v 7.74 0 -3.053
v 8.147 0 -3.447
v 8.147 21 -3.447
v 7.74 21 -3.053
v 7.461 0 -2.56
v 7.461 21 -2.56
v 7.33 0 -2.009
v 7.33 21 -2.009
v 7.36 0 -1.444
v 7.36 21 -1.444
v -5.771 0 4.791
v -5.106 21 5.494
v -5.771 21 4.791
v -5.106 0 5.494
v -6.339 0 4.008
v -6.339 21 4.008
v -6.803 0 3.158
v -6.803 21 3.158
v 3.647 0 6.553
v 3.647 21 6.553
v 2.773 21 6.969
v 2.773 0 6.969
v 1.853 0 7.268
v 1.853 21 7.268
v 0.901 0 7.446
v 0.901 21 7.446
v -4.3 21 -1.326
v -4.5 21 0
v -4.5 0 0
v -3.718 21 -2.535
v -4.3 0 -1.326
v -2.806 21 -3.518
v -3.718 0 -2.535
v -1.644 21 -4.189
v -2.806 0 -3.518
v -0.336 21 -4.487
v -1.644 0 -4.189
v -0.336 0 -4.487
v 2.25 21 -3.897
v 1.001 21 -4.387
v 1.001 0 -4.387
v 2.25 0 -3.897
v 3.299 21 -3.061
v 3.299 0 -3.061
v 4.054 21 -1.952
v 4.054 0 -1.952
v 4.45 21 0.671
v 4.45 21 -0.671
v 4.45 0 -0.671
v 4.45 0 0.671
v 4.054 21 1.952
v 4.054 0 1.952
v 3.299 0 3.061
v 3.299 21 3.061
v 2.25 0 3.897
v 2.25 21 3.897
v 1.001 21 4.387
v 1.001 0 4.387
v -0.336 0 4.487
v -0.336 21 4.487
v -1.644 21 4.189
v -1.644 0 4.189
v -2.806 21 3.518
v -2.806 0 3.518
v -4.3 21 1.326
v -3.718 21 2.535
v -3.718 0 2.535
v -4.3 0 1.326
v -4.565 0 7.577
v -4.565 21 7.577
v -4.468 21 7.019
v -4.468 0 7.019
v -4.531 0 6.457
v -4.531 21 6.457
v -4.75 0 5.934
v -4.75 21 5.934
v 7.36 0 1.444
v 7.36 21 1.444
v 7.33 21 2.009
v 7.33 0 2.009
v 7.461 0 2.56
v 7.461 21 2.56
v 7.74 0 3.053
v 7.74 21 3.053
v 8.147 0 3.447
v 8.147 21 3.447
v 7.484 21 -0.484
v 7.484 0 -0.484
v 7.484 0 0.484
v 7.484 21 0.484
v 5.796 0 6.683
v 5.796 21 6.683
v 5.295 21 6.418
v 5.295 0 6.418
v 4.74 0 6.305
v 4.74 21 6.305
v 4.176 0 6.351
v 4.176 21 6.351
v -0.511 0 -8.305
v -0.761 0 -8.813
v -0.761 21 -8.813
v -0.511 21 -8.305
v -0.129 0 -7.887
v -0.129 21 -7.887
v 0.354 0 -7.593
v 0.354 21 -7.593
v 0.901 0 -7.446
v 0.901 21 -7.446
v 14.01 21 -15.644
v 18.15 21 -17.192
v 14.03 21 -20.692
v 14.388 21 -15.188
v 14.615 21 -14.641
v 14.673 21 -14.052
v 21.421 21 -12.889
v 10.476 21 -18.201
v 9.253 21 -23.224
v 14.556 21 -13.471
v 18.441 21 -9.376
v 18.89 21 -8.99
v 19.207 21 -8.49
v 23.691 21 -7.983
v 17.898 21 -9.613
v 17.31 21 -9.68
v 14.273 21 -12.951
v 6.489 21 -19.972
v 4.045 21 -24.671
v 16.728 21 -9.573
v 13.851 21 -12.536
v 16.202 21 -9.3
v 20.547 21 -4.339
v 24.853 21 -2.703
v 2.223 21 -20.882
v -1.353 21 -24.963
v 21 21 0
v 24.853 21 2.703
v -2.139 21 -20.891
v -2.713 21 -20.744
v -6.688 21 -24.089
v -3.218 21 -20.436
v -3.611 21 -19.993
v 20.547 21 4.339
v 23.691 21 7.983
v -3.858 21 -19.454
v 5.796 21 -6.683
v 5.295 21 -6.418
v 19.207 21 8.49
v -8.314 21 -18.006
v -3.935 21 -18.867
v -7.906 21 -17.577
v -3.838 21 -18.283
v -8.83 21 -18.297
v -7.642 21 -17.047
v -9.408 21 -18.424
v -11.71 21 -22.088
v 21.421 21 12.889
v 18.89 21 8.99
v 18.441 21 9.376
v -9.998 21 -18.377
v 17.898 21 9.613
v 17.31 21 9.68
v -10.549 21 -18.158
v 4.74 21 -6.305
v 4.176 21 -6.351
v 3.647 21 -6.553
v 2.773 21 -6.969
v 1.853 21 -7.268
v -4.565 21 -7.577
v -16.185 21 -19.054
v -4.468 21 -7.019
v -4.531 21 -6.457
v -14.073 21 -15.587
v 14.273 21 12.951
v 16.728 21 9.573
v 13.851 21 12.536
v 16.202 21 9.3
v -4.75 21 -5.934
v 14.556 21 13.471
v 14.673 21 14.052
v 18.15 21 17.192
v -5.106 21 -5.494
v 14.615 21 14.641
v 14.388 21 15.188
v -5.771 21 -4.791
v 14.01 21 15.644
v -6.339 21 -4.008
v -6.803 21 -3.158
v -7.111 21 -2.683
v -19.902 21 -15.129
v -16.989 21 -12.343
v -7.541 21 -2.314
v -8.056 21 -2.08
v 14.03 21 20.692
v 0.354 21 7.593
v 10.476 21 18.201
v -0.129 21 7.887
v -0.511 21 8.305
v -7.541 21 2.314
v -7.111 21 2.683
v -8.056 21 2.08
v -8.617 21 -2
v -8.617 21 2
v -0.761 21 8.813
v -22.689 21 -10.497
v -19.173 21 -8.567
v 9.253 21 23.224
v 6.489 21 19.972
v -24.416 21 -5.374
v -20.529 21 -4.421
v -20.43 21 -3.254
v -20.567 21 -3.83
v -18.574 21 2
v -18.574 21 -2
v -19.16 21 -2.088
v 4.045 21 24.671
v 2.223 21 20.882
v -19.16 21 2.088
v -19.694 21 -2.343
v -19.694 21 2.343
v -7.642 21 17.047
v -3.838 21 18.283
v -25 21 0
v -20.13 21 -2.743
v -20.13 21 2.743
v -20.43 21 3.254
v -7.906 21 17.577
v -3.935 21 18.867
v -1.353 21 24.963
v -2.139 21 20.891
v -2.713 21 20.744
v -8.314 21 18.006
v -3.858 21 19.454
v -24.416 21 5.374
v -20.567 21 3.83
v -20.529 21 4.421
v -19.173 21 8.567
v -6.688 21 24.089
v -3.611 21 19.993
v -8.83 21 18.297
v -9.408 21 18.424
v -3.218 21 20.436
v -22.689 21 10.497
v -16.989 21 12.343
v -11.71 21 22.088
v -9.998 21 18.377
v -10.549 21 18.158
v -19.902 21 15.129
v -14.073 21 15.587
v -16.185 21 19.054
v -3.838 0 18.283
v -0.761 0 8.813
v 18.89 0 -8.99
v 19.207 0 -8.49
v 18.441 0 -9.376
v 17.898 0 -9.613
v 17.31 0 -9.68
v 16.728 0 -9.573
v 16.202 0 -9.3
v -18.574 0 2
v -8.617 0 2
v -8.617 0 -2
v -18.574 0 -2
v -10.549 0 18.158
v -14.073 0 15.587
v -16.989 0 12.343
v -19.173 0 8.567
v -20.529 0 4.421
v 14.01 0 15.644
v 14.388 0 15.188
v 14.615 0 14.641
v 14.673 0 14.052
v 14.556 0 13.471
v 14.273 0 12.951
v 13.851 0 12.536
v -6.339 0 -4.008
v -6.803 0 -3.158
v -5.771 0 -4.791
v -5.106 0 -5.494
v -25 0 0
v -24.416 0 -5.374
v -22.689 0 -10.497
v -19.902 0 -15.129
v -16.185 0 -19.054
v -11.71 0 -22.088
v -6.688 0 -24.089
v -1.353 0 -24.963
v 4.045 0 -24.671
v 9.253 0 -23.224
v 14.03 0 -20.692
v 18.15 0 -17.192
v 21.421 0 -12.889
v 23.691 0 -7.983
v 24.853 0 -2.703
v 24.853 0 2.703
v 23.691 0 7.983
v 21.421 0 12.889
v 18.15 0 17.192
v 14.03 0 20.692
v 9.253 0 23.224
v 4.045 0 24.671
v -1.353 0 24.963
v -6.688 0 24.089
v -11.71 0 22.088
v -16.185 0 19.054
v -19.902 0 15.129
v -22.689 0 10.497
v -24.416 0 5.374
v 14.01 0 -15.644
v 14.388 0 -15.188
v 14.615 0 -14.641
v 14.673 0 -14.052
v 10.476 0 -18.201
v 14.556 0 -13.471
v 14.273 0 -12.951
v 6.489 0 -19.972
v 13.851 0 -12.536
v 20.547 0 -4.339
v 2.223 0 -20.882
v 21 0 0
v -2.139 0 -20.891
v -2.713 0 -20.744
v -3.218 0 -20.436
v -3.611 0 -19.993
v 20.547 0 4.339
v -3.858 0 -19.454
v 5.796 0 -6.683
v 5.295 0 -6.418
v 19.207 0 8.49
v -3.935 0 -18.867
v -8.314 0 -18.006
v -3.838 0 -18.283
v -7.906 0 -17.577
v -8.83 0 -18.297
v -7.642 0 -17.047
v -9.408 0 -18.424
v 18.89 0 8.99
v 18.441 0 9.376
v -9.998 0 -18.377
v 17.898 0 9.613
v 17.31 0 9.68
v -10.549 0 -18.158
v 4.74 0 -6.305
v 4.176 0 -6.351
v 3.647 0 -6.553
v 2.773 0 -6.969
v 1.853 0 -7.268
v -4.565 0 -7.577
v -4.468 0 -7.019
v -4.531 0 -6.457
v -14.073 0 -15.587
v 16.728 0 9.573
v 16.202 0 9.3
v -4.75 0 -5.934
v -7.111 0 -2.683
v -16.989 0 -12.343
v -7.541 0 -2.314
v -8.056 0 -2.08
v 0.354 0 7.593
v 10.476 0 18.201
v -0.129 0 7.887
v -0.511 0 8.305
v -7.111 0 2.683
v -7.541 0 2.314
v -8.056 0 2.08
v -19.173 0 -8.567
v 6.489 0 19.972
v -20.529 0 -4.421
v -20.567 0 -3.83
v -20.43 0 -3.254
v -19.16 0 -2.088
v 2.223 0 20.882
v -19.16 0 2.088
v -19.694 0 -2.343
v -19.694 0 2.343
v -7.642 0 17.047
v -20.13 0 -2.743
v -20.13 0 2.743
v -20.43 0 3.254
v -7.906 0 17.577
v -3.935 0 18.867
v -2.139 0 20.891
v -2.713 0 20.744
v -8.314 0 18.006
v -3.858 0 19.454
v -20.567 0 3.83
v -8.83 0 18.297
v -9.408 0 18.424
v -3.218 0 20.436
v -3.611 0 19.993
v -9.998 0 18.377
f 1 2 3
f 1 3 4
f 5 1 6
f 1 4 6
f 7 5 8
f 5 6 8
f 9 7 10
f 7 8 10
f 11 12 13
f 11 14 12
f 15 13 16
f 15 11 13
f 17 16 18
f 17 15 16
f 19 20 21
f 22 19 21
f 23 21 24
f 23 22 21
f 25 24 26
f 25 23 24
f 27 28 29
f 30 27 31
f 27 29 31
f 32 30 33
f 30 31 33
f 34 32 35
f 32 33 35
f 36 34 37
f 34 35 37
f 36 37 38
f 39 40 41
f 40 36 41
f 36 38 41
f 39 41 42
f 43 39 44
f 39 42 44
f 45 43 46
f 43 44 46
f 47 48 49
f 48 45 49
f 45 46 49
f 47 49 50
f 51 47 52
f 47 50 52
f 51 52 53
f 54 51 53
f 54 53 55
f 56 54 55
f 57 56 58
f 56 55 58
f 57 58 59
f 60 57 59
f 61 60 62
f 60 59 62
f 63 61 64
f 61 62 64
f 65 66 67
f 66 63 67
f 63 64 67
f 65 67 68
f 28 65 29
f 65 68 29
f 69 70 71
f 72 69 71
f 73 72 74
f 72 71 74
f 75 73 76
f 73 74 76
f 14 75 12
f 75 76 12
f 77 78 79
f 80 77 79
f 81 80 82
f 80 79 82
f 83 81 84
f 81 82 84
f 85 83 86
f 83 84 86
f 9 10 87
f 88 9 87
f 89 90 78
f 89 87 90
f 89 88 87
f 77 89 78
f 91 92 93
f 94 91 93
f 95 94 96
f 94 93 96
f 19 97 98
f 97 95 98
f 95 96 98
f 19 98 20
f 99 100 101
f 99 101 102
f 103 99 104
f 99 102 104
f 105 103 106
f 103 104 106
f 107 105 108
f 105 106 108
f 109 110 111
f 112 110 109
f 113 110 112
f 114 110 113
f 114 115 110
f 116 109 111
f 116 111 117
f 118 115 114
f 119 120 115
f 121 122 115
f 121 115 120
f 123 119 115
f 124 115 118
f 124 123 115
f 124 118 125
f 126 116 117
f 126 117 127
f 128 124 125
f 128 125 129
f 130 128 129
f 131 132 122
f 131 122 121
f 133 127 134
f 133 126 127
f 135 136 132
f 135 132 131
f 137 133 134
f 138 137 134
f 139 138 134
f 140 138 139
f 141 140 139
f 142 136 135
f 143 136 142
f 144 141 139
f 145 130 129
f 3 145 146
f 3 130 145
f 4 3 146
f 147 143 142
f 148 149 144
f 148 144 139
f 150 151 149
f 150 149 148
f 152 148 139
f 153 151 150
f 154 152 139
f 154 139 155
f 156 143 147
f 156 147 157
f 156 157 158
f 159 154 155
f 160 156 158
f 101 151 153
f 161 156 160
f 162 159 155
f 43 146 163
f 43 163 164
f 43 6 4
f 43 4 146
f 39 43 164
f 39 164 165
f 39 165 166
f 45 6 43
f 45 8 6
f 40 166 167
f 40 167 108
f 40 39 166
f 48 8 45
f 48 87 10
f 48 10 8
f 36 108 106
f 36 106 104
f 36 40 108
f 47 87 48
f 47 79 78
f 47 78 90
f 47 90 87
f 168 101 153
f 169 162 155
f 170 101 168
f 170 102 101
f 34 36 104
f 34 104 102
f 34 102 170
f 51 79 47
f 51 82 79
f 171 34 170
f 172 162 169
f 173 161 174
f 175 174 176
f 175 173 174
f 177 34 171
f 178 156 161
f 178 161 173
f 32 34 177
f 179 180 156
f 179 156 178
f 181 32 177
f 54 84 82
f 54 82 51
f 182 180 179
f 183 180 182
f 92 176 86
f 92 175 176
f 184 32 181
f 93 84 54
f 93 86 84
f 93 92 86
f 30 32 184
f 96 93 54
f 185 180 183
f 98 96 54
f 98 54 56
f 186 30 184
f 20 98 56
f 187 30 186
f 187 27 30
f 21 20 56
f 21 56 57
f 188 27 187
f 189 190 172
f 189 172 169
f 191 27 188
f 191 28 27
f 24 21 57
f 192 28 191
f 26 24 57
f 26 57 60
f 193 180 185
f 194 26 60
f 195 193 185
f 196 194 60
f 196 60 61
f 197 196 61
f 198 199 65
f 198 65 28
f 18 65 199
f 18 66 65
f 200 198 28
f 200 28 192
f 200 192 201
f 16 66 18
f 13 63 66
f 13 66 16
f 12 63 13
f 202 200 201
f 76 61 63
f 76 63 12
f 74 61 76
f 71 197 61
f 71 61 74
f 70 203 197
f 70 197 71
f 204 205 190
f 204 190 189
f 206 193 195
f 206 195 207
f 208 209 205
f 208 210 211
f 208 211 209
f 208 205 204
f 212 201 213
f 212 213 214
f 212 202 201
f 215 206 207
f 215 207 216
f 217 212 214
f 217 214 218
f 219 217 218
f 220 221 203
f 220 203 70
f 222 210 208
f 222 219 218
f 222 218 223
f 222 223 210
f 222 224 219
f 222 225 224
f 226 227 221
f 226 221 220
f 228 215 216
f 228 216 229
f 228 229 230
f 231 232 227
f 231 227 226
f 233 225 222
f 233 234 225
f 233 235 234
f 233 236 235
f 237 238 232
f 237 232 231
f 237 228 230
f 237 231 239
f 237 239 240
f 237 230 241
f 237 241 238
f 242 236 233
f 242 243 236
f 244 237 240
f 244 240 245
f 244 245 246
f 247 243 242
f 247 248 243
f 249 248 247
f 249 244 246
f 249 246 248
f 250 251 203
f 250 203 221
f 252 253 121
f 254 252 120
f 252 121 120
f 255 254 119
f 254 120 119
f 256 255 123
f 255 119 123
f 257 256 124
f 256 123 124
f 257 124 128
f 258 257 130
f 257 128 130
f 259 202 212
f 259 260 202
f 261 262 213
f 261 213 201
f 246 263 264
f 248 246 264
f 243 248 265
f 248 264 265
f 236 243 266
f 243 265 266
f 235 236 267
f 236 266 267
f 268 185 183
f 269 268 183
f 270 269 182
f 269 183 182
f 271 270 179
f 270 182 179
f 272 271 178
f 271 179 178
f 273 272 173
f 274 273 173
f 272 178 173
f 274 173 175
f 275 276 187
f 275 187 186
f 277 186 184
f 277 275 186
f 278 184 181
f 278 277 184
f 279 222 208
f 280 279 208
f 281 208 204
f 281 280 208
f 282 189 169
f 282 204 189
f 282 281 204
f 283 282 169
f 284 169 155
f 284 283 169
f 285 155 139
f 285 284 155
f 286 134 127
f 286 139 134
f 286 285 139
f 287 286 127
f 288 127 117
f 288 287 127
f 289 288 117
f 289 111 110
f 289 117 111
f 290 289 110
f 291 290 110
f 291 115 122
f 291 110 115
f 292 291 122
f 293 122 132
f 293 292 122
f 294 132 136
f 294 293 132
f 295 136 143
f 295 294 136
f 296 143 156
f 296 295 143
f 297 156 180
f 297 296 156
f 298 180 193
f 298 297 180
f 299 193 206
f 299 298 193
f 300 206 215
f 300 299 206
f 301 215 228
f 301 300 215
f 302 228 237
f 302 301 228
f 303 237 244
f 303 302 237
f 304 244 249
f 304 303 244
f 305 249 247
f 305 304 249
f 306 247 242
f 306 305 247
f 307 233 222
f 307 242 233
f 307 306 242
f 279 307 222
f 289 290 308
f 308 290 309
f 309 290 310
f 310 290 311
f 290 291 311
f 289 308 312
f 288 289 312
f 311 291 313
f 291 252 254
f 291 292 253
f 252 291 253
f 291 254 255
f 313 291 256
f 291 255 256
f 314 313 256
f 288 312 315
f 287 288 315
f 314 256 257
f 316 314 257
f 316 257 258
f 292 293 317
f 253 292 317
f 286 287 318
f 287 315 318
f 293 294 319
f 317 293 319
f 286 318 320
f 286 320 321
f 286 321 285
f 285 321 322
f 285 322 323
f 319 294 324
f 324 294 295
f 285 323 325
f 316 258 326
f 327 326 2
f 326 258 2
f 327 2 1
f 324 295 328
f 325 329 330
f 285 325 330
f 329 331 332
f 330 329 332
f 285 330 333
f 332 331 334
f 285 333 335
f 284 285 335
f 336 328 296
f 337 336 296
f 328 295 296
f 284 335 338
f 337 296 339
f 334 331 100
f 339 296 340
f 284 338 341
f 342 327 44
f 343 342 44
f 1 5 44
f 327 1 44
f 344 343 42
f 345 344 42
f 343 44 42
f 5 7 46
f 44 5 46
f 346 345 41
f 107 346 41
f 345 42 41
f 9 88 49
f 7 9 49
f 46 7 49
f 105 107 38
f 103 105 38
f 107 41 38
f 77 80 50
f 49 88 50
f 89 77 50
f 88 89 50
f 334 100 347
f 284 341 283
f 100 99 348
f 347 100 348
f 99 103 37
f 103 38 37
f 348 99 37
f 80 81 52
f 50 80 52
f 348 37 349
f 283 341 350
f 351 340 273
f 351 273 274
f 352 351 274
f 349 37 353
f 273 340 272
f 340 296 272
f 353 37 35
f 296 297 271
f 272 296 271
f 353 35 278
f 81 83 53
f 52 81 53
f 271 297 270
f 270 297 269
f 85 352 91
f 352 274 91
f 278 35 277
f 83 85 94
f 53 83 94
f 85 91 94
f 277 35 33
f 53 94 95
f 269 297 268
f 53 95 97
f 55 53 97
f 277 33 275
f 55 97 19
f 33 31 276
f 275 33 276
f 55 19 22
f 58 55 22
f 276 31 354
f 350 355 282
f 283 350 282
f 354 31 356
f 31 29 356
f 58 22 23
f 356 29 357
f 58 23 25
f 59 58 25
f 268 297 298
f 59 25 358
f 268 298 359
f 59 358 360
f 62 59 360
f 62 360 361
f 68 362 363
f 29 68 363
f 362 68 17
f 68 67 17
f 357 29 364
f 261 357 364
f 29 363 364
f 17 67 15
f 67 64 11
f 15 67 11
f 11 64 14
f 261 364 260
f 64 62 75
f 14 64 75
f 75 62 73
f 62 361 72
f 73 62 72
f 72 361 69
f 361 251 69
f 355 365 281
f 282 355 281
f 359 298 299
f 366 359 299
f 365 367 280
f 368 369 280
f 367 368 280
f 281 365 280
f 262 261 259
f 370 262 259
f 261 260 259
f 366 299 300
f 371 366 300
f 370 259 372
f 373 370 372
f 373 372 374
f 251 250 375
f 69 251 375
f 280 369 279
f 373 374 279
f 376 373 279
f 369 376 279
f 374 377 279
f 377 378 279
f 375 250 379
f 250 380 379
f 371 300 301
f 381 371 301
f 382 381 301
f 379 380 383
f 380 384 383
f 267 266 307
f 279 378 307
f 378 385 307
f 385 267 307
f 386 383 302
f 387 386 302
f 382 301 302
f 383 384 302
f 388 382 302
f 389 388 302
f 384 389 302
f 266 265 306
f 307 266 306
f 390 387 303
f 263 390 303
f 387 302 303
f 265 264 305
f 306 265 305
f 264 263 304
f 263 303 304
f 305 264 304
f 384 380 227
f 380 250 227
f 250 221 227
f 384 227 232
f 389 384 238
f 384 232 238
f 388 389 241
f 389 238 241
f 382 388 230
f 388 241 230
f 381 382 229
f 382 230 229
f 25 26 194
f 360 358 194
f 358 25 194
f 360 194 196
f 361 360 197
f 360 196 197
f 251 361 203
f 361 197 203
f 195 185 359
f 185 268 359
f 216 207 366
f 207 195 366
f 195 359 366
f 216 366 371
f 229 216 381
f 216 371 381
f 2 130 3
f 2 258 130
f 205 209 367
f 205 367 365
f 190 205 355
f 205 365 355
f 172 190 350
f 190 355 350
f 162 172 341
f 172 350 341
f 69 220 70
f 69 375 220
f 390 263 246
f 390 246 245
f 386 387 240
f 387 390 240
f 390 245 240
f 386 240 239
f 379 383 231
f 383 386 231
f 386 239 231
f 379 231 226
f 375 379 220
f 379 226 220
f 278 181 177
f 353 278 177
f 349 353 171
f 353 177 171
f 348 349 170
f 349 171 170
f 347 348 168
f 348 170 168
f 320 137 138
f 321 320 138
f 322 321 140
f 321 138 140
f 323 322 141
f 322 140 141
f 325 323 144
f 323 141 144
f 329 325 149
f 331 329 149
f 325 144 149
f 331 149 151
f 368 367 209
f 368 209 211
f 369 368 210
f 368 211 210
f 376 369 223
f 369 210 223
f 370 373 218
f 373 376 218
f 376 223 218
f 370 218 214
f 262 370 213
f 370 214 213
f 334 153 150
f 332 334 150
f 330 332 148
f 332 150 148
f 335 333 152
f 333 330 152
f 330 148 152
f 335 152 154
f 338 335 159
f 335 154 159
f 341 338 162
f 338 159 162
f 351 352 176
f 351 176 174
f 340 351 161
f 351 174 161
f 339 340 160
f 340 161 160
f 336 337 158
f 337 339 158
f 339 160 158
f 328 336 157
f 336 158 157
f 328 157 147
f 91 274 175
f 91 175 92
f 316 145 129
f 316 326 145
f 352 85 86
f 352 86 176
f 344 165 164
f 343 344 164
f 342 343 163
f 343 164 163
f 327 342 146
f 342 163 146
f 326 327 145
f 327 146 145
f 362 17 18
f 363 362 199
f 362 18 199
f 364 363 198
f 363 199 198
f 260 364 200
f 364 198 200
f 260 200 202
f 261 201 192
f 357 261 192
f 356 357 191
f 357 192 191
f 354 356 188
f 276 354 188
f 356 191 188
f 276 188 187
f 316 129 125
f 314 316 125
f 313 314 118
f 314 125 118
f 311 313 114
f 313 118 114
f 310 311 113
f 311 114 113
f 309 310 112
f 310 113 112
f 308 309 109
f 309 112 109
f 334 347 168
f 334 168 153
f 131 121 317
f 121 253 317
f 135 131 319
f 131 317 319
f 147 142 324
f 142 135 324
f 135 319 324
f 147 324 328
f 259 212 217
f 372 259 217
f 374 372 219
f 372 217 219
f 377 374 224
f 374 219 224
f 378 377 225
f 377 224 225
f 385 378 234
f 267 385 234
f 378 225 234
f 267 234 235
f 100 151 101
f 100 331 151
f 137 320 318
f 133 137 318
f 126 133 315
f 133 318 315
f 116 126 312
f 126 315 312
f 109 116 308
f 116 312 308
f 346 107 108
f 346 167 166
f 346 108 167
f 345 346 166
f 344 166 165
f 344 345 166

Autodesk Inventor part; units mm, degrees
ref_plane "YZ Plane" through (0, 0, 0) normal (1, 0, 0) x (0, 1, 0)
ref_plane "XZ Plane" through (0, 0, 0) normal (0, 1, 0) x (-1, 0, 0)
ref_plane "XY Plane" through (0, 0, 0) normal (0, 0, 1) x (1, 0, 0)
sketch "Sketch1" plane through (0, 0, 0) normal (0, 1, 0) x (-1, 0, 0)
  circle A0 centre (0, 0) radius 4.5
  circle A1 centre (0, 0) radius 25
  circle A2 centre (0, 0) radius 7.5
  circle A3 centre (0, 0) radius 21
  line L0 (0, 0) -> (25, 0)
  line L1 (22.5, 2) -> (22.5, -2)
  line L2 (22.5, -2) -> (2.5, -2)
  line L3 (2.5, -2) -> (2.5, 2)
  line L4 (2.5, 2) -> (22.5, 2)
  line L5 (22.5, 2) -> (2.5, -2) construction
  line L6 (22.5, -2) -> (2.5, 2) construction
  line L7 (5.0508, 22.0168) -> (8.855, 20.7807)
  line L8 (-1.1296, 2.9957) -> (5.0508, 22.0168)
  line L9 (8.855, 20.7807) -> (2.6747, 1.7596)
  line L10 (2.6747, 1.7596) -> (-1.1296, 2.9957)
  line L11 (-19.3785, 11.6071) -> (-17.0273, 14.8432)
  line L12 (-3.1981, -0.1486) -> (-19.3785, 11.6071)
  line L13 (-17.0273, 14.8432) -> (-0.847, 3.0875)
  line L14 (-0.847, 3.0875) -> (-3.1981, -0.1486)
  line L15 (-17.0273, -14.8432) -> (-19.3785, -11.6071)
  line L16 (-0.847, -3.0875) -> (-17.0273, -14.8432)
  line L17 (-19.3785, -11.6071) -> (-3.1981, 0.1486)
  line L18 (-3.1981, 0.1486) -> (-0.847, -3.0875)
  line L19 (8.855, -20.7807) -> (5.0508, -22.0168)
  line L20 (2.6747, -1.7596) -> (8.855, -20.7807)
  line L21 (5.0508, -22.0168) -> (-1.1296, -2.9957)
  line L22 (-1.1296, -2.9957) -> (2.6747, -1.7596)
  point P0 (12.5, 0)
  point P1 (7.2284, -2)
  point P2 (20.9045, -2)
  point P3 (8.362, -19.2634)
  point P4 (4.1358, -6.2566)
  point P5 (7.2284, 2)
  point P6 (4.1358, 6.2566)
  point P7 (8.362, 19.2634)
  point P8 (20.9045, 2)
  point P9 (0.3316, 7.4927)
  point P10 (-4.6723, 5.8668)
  point P11 (-15.7366, 13.9054)
  point P12 (4.5577, 20.4994)
  point P13 (-4.6723, -5.8668)
  point P14 (0.3316, -7.4927)
  point P15 (4.5577, -20.4994)
  point P16 (-15.7366, -13.9054)
  point P17 (-7.0235, 2.6307)
  point P18 (-7.0235, -2.6307)
  point P19 (-18.0877, -10.6693)
  point P20 (-18.0877, 10.6693)
  dimension "d1" = 50
  dimension "d0" = 9
  dimension "d2" = 3
  dimension "d3" = 4
  dimension "d4" = 4
  dimension "d5" = 20
  dimension "d8" = 360
extrude "Extrusion1" add sketch "Sketch1" along normal blind 21 contours L0 A2 L2 A0 | A0 L4 A2 L0 | A0 L9 A2 L4 | L2 A2 L20 A0 | L0 A3 L2 A2 | A2 L4 A3 L0 | A0 L8 A2 L9 | L20 A2 L21 A0 | L0 L1 L2 A3 | A3 L4 L1 L0 | A0 L13 A2 L8 | A2 L8 A3 L9 | A1 | L21 A2 L16 A0 | L20 A3 L21 A2 | A0 L12 A2 L13 | A3 L8 L7 L9 | L16 A2 L17 A0 | L20 L19 L21 A3 | A0 L17 A2 L12 | A2 L12 A3 L13 | L16 A3 L17 A2 | A3 L12 L11 L13 | L16 L15 L17 A3
fillet "Fillet1" radius 2 4 edges at (-8.362, 10.5, 19.2634) (-20.9045, 10.5, 2) (-7.2284, 10.5, 2) (-4.1358, 10.5, 6.2566)
pattern_circular "Circular Pattern1" count 5 over 360 about axis through (0, 0, 0) along (0, 1, 0) of "Fillet1"
properties part number "8_21mm"
